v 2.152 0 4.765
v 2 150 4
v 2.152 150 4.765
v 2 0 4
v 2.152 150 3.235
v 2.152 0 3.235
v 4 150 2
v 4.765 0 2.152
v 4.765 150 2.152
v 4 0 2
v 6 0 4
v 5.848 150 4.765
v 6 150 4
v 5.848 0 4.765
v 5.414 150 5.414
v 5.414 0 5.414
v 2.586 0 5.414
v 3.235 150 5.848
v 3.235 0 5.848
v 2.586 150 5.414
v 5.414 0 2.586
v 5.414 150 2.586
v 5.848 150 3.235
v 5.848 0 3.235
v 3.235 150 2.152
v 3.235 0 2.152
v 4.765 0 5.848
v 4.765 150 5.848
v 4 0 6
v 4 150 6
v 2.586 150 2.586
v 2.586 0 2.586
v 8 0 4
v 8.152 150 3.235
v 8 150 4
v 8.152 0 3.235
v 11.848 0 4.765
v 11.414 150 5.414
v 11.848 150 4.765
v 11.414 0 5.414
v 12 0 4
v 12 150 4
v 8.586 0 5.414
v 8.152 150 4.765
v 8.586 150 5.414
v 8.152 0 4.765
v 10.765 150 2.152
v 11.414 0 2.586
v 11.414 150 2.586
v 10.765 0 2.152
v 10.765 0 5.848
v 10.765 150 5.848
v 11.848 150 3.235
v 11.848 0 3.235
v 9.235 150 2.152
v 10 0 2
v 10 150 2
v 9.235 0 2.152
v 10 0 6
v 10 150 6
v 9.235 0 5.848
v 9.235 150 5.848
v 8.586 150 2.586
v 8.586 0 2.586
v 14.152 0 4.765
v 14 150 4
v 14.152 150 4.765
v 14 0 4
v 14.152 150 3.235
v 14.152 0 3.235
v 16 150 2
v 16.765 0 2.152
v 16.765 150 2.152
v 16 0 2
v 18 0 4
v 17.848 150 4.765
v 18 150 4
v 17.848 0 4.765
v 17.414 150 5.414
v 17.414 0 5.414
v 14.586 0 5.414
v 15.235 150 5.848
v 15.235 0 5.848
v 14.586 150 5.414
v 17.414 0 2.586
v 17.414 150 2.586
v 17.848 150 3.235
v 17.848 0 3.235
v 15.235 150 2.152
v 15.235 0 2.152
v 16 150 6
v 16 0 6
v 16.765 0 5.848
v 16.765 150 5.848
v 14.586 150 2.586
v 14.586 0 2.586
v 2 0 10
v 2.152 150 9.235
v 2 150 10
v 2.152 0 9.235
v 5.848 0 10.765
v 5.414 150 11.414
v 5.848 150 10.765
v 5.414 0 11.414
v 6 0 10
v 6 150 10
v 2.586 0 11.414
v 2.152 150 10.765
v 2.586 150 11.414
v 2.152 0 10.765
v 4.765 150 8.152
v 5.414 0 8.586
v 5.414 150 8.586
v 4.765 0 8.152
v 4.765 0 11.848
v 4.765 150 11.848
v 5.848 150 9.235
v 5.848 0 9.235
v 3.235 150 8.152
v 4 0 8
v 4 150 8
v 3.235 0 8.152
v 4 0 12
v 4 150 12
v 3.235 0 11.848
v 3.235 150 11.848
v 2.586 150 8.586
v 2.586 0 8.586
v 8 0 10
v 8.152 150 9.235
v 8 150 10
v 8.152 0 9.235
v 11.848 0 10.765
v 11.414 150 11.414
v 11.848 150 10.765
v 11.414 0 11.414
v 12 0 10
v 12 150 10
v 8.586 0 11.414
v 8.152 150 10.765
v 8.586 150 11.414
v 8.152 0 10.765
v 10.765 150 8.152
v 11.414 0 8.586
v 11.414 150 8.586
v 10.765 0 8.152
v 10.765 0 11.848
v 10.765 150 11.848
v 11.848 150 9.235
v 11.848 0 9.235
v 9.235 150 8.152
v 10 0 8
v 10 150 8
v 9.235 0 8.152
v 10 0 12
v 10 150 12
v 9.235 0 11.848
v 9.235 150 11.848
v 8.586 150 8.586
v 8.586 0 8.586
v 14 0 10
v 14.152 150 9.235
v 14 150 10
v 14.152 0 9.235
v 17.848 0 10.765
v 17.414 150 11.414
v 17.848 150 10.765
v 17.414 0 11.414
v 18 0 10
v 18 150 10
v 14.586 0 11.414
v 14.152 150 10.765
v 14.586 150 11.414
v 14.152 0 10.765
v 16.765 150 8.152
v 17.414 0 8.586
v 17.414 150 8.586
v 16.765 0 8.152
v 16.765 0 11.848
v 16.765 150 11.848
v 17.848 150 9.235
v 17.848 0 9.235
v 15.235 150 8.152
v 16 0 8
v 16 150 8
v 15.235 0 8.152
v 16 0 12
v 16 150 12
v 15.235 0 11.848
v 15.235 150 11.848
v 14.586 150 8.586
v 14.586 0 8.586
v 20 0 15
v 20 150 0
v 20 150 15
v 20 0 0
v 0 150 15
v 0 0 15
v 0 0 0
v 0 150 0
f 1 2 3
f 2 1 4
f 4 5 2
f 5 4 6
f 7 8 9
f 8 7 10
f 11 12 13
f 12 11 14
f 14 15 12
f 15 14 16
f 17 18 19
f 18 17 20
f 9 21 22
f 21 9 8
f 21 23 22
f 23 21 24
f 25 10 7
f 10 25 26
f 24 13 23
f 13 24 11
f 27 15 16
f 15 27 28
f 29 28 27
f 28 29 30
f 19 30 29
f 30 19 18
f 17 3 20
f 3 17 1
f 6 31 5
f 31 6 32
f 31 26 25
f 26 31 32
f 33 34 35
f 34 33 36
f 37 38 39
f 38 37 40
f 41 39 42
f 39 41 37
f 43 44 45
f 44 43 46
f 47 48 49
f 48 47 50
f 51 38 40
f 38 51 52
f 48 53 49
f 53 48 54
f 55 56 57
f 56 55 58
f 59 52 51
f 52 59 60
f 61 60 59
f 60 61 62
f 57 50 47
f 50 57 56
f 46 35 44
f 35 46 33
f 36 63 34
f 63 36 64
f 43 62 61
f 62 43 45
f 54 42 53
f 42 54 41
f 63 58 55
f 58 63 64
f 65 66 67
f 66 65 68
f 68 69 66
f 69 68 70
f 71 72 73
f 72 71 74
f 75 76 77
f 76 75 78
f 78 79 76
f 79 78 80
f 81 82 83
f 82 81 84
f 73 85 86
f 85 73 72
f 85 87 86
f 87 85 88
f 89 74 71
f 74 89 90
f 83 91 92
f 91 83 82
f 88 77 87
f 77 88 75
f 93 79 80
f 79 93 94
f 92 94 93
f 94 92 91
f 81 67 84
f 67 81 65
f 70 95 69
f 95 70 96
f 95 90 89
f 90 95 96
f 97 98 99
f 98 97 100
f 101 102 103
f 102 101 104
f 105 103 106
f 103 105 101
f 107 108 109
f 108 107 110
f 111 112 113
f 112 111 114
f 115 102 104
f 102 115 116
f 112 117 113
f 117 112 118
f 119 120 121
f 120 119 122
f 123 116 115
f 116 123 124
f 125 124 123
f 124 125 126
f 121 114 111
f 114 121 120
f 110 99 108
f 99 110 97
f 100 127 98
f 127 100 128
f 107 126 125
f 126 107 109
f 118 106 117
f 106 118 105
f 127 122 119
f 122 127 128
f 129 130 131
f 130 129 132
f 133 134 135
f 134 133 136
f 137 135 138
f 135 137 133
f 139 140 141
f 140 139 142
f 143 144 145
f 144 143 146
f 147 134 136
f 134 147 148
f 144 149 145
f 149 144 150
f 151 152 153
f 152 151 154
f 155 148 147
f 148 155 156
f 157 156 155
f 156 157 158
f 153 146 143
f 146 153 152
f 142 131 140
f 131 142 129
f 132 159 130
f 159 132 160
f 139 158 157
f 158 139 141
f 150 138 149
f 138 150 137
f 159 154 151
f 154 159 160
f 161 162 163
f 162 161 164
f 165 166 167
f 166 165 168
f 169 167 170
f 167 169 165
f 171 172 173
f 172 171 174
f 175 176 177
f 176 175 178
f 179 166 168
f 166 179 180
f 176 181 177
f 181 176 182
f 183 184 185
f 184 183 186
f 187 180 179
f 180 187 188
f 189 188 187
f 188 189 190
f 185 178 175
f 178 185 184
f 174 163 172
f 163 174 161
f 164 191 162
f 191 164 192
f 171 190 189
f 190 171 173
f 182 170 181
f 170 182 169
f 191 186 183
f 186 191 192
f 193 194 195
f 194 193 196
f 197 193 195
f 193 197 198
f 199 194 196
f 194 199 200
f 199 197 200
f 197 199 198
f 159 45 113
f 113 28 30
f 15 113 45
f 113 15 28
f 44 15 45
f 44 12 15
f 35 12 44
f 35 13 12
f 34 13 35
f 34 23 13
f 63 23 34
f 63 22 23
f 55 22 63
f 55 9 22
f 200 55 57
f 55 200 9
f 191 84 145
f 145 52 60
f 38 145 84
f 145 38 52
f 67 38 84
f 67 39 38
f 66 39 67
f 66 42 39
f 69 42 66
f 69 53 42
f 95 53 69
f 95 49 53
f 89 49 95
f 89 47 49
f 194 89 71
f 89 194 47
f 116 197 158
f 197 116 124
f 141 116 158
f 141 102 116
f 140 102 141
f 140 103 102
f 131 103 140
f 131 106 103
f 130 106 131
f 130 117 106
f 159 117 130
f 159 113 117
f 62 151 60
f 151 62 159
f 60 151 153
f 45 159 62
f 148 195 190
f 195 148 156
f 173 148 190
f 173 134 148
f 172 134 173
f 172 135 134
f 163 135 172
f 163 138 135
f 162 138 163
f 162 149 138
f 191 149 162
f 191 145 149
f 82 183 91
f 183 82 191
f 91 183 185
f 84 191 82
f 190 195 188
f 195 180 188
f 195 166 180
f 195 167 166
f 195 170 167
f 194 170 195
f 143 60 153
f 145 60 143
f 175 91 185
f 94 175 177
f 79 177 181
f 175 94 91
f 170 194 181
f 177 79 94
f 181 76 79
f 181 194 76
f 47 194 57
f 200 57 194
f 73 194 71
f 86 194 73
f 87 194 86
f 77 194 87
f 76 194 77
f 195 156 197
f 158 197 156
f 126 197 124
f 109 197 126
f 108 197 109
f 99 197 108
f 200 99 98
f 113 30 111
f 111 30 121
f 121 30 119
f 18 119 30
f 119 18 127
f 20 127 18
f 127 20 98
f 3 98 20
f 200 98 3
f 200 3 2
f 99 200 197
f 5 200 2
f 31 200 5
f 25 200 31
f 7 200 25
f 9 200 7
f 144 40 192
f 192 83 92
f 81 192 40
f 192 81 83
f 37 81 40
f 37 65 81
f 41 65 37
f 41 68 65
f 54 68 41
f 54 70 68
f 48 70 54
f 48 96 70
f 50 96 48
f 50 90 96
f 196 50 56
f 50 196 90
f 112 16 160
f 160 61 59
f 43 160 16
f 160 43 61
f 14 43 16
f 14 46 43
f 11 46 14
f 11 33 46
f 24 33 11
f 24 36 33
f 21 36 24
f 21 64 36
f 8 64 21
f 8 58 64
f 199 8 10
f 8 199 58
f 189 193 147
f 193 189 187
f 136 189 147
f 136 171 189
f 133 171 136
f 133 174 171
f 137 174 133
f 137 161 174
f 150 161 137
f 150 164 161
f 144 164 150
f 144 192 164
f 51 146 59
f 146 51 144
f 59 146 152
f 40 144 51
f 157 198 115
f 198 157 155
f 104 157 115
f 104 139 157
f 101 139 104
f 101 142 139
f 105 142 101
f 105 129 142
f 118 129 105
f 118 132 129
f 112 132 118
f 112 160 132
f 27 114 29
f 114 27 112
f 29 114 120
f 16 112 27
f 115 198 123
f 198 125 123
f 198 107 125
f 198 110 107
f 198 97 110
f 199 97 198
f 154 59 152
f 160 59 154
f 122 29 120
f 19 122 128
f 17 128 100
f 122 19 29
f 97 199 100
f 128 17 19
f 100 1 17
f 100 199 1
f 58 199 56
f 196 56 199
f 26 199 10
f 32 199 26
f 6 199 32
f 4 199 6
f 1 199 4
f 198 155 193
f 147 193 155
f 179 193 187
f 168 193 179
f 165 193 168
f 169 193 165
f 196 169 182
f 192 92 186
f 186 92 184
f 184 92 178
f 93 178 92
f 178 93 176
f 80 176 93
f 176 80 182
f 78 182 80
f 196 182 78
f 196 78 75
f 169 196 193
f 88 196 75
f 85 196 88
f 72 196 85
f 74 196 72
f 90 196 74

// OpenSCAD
difference() {
	cube( [20,150,15] );
	for( z=[4:6:15] ) {
		for( x=[4:6:20] ) {
			translate( [x, 160, z] ) rotate(90,[1,0,0]) cylinder( r=2, h=170, $fn=16 );
		}
	}
}
